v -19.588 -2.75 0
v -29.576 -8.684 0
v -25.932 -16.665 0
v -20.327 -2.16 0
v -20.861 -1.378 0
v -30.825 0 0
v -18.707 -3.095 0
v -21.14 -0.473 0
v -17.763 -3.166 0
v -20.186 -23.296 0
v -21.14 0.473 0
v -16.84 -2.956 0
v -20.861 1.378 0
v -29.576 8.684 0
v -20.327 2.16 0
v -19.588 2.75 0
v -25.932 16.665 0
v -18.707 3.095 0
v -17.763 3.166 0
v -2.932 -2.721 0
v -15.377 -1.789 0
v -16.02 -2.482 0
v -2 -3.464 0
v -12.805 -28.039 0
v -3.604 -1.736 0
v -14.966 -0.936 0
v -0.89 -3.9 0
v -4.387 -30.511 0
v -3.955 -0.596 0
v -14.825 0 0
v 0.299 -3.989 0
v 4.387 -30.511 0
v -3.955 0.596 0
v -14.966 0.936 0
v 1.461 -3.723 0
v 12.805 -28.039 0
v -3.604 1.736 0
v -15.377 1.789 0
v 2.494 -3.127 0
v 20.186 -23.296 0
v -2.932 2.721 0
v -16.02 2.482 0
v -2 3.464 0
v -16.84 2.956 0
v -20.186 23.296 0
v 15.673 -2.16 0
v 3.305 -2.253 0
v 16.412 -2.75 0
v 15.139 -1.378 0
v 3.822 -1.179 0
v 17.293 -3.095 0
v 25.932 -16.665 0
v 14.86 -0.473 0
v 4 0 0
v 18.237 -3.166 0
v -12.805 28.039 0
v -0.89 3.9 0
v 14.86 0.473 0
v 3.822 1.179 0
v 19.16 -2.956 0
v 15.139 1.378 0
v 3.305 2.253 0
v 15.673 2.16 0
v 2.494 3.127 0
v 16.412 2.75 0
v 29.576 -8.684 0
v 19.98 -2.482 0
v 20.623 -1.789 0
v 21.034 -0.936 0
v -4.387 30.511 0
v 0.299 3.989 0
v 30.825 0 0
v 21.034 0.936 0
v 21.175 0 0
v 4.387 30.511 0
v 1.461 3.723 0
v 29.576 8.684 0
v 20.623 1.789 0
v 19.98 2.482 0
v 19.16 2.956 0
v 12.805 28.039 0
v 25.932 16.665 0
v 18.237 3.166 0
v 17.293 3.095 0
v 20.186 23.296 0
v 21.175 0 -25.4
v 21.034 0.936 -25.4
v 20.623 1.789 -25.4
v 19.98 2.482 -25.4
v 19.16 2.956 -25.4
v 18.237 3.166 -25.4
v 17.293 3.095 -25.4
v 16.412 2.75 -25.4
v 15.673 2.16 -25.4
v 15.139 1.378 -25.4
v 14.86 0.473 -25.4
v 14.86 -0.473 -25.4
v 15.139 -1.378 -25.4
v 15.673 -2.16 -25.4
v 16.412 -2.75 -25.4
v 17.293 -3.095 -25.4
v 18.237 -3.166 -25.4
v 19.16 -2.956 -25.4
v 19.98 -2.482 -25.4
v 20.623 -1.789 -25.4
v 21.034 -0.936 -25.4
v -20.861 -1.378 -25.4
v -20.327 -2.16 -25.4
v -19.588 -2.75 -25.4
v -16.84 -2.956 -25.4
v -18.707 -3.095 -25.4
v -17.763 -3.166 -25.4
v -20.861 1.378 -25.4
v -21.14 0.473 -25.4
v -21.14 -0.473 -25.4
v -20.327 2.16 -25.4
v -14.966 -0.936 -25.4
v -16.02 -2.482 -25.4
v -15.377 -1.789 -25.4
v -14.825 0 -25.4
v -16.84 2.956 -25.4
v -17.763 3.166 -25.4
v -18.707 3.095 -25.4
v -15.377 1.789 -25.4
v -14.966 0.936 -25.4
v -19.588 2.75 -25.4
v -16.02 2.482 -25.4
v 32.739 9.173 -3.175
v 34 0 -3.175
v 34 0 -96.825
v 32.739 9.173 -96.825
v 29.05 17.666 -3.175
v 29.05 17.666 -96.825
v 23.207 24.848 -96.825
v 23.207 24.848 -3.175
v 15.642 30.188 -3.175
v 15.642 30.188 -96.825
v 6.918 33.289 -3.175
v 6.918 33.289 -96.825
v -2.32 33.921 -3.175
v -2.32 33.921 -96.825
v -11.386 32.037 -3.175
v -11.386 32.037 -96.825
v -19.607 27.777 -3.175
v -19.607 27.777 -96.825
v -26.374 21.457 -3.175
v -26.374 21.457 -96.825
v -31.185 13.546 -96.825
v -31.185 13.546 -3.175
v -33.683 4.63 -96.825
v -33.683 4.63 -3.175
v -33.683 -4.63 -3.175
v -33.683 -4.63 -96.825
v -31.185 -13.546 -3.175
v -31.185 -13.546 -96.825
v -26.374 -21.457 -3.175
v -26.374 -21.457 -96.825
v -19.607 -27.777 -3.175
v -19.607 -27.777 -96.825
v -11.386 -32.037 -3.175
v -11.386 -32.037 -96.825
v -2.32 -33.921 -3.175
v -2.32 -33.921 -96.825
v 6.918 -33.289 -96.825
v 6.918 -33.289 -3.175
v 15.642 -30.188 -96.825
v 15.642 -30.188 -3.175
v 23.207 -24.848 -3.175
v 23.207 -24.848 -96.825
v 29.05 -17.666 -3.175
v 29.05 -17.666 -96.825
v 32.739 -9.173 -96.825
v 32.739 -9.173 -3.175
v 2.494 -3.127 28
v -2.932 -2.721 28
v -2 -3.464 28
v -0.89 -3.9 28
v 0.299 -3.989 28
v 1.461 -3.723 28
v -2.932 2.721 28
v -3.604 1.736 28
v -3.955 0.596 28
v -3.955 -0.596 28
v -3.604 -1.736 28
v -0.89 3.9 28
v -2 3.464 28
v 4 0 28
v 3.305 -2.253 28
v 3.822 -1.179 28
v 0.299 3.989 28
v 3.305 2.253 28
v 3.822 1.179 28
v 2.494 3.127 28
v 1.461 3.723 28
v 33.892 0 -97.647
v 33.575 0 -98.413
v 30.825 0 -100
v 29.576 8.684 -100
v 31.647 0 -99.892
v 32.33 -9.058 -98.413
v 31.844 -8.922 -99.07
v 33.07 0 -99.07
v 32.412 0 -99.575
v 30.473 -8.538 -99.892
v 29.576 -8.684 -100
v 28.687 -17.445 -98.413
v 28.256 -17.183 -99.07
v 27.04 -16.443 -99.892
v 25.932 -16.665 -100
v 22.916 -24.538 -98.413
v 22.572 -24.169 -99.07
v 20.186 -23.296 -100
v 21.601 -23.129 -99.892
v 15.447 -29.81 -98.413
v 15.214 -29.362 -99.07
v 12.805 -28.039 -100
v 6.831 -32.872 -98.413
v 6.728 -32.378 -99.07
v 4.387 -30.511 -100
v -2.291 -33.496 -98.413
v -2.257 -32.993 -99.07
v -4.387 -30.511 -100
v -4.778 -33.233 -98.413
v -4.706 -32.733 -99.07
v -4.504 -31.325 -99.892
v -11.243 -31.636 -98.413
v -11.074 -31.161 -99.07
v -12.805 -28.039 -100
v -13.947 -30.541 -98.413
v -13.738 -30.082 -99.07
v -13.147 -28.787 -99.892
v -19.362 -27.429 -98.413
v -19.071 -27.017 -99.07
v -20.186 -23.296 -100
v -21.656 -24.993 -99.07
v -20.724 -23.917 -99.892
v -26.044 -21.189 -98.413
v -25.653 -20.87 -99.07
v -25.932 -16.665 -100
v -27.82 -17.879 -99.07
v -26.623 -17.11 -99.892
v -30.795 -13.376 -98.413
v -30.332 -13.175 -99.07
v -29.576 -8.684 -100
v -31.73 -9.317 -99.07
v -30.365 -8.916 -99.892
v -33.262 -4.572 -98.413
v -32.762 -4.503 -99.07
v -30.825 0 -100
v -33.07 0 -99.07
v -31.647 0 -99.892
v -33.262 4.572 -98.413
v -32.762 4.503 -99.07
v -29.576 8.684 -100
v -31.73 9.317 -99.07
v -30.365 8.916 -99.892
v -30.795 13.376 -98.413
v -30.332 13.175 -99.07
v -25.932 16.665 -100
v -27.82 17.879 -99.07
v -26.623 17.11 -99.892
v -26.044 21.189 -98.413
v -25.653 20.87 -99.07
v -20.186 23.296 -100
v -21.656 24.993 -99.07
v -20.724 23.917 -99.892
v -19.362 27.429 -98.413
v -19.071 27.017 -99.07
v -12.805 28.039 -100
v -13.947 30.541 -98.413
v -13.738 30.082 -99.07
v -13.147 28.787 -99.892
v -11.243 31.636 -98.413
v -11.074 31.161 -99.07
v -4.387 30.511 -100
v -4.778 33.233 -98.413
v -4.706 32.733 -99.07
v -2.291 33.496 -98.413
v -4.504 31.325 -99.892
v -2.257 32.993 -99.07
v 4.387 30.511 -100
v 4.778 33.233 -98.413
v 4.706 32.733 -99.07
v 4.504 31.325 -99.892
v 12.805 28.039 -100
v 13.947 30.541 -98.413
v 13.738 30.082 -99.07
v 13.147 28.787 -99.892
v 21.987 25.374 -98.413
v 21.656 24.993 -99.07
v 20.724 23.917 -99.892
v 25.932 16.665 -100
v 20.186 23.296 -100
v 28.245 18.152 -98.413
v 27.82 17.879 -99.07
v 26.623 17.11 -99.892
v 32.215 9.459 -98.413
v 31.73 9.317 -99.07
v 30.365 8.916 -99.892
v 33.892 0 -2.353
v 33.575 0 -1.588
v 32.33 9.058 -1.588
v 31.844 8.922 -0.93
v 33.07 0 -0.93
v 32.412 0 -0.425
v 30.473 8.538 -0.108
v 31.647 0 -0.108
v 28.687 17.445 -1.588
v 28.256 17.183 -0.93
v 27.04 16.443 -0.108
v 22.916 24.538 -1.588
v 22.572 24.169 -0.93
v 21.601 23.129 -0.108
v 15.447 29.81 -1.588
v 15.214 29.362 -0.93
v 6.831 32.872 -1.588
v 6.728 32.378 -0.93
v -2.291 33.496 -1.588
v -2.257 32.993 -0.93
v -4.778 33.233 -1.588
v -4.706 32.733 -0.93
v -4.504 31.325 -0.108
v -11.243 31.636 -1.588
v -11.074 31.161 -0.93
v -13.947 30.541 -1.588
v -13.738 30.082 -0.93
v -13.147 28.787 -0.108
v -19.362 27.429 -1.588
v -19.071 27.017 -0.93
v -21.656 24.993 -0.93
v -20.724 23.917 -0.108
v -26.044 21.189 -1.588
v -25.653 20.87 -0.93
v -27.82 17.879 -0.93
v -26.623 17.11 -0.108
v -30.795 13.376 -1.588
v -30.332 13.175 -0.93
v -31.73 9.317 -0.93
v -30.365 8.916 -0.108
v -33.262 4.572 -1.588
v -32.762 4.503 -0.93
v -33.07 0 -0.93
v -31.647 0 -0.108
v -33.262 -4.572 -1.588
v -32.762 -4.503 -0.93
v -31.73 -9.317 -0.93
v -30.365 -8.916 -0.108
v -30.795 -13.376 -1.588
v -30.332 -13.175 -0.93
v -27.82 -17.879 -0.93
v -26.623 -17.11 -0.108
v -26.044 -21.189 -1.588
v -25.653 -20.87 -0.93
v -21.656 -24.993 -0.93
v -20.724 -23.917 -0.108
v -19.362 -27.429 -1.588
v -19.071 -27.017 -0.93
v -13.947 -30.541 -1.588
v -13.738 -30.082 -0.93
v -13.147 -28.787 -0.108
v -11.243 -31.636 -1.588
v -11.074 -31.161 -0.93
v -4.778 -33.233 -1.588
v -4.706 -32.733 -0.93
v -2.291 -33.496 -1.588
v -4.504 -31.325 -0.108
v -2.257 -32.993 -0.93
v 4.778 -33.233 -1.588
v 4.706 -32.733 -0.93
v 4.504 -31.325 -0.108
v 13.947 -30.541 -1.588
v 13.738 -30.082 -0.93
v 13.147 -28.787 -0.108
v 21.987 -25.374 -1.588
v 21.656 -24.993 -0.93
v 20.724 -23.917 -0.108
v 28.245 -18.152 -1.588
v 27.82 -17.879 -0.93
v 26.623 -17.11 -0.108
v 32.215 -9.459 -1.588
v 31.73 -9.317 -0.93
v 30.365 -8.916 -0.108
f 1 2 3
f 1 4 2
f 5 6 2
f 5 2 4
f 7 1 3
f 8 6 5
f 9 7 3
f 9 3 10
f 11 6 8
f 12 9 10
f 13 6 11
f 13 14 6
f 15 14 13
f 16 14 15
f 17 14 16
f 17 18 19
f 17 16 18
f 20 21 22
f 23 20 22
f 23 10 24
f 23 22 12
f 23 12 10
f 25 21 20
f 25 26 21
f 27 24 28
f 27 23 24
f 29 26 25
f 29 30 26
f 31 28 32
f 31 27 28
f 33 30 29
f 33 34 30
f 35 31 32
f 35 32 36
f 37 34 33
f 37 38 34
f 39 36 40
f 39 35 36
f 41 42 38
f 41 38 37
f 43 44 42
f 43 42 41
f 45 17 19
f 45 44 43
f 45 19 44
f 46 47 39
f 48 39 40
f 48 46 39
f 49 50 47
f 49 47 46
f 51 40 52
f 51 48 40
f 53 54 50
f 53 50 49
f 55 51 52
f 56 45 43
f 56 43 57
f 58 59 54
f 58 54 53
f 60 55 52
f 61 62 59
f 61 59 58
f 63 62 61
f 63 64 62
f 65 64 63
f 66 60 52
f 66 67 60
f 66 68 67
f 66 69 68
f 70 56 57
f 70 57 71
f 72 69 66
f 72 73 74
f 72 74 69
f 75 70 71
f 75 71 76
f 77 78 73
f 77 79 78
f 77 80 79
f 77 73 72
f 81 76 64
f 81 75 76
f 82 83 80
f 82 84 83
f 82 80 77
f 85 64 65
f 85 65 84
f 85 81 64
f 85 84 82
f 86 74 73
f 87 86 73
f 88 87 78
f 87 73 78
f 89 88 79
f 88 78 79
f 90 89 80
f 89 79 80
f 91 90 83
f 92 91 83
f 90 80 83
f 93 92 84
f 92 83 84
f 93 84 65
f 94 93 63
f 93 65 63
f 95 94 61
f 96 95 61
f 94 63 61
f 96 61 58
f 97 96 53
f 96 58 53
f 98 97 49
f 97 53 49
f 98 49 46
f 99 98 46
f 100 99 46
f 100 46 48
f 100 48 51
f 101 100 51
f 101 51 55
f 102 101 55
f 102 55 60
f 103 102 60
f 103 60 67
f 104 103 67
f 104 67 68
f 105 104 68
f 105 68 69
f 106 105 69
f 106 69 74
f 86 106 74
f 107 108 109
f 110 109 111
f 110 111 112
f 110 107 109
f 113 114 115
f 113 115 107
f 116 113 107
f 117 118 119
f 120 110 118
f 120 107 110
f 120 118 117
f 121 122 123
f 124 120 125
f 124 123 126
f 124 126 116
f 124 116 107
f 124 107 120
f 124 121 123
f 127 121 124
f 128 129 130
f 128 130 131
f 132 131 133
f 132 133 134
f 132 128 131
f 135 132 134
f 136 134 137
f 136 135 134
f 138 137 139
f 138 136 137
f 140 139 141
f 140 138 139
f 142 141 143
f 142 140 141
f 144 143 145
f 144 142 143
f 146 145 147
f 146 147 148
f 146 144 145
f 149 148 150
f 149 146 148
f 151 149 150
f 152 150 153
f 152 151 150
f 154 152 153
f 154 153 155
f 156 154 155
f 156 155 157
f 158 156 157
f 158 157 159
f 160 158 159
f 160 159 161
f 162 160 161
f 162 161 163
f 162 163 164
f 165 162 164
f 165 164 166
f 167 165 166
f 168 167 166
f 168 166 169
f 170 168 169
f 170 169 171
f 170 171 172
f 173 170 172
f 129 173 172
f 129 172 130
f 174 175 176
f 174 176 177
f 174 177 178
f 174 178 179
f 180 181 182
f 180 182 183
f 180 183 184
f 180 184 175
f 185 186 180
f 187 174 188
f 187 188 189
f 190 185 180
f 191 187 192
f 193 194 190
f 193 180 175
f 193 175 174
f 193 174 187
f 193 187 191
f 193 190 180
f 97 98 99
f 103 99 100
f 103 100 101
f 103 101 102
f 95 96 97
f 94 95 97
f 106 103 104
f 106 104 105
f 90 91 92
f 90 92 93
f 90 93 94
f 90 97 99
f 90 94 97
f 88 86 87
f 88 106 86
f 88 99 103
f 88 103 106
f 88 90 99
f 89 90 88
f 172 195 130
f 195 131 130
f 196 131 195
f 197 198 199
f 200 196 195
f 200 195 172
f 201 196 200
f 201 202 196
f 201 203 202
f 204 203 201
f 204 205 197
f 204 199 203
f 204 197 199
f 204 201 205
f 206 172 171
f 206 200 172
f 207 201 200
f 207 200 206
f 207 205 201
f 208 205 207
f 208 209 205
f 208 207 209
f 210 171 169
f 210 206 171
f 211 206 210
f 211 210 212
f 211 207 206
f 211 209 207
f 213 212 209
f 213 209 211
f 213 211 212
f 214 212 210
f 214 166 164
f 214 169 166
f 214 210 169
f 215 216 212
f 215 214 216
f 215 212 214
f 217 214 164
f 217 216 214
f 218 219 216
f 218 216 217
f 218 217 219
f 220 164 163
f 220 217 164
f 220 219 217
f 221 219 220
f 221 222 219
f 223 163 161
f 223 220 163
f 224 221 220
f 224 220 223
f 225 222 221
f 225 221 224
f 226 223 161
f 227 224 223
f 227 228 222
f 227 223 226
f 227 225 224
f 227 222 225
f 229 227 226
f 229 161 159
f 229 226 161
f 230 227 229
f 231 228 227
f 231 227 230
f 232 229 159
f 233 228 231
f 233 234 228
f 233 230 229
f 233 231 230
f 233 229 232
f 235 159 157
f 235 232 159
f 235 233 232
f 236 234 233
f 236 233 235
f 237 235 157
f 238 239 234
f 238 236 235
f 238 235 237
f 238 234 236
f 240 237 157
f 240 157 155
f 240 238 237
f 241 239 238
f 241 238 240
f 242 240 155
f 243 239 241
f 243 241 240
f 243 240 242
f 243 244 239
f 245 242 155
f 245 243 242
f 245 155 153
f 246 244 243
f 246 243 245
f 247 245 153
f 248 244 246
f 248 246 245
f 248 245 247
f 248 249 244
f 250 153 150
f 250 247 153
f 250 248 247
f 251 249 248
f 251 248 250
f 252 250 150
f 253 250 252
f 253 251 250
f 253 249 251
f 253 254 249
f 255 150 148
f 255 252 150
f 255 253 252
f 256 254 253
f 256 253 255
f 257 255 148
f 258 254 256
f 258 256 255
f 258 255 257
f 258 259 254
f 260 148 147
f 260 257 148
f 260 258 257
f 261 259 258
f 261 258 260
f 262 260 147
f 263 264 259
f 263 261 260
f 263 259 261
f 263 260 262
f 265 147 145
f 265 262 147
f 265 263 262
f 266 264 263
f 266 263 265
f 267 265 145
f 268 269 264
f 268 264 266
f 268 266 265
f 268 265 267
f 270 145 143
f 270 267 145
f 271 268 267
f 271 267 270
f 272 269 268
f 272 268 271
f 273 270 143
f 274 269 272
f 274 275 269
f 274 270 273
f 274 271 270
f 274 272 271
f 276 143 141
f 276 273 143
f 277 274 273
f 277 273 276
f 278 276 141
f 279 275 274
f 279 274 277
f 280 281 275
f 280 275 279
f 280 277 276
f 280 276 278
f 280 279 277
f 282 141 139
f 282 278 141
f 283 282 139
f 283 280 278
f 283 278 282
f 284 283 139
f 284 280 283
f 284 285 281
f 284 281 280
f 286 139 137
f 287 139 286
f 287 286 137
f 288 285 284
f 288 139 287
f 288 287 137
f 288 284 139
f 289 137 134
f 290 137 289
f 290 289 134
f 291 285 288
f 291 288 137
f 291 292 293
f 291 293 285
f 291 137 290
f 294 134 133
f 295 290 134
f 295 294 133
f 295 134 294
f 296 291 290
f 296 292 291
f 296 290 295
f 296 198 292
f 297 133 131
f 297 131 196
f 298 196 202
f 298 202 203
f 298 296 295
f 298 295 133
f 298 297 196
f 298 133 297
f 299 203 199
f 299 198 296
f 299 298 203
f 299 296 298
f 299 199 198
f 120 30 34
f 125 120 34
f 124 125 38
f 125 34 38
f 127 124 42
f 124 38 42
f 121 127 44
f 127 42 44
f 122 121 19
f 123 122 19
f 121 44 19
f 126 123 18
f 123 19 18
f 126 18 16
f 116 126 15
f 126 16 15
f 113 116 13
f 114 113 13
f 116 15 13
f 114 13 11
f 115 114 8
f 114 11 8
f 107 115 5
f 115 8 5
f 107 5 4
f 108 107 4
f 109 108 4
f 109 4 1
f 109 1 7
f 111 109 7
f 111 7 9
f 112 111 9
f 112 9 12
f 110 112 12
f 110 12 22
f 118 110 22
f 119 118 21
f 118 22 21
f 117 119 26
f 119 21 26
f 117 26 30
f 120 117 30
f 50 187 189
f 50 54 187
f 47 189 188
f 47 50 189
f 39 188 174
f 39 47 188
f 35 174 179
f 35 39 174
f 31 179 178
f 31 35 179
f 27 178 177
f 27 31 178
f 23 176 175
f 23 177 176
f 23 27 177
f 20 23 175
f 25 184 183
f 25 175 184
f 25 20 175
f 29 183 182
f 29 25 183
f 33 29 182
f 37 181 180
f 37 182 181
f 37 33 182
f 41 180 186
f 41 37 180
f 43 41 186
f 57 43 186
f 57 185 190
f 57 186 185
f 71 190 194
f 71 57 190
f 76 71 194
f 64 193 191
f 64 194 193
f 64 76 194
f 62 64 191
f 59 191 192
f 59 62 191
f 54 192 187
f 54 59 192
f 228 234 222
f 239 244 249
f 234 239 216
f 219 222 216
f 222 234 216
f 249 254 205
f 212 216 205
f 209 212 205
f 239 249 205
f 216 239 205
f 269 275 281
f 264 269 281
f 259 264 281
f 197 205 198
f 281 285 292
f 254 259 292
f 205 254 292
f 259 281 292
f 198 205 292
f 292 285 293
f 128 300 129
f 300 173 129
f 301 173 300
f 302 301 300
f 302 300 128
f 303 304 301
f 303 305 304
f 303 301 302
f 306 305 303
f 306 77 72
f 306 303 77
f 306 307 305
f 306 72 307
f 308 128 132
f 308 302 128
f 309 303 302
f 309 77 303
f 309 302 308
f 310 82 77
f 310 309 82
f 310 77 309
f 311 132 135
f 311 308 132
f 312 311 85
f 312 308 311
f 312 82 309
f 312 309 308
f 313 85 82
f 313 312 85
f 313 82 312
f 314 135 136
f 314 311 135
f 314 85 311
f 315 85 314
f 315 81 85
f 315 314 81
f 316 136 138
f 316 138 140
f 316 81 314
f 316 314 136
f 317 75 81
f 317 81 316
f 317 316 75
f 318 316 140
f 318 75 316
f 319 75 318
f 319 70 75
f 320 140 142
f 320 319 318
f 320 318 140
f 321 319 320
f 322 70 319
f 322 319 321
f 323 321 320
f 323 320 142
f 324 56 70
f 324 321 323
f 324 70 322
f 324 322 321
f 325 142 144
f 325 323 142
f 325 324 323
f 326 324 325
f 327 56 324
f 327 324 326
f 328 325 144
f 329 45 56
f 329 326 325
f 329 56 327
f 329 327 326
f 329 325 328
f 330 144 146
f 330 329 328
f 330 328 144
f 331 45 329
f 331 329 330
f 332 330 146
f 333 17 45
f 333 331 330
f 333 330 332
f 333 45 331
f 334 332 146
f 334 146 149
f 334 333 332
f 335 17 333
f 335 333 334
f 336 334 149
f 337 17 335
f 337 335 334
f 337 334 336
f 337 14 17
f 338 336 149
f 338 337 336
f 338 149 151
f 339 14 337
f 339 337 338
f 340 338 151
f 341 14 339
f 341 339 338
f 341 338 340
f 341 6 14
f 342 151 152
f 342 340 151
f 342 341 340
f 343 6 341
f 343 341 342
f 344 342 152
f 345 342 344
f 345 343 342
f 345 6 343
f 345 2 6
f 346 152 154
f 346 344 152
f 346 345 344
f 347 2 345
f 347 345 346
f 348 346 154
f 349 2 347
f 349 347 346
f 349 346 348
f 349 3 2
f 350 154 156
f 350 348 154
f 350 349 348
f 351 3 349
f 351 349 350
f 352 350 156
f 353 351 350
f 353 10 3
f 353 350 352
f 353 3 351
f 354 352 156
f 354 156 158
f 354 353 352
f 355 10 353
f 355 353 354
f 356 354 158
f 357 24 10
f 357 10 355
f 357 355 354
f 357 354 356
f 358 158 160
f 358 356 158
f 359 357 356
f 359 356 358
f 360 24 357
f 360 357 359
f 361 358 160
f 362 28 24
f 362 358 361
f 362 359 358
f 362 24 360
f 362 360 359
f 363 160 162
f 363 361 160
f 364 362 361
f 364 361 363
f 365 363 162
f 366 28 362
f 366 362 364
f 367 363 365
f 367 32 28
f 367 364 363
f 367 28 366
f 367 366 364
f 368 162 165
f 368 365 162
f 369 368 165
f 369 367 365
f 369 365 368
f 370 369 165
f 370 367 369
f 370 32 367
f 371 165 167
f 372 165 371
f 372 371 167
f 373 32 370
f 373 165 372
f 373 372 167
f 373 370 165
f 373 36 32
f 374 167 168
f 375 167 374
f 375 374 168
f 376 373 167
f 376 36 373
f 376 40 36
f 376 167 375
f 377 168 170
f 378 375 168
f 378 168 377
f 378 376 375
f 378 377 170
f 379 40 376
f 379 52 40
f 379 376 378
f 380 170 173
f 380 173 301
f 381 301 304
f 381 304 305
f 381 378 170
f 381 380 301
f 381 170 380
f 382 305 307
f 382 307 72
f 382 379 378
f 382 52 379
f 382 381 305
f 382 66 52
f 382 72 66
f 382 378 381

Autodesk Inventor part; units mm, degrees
ref_plane "YZ Plane" through (0, 0, 0) normal (1, 0, 0) x (0, 1, 0)
ref_plane "XZ Plane" through (0, 0, 0) normal (0, 1, 0) x (-1, 0, 0)
ref_plane "XY Plane" through (0, 0, 0) normal (0, 0, 1) x (1, 0, 0)
sketch "Sketch1" plane through (0, 0, 0) normal (0, 0, 1) x (1, 0, 0)
  circle A0 centre (0, 0) radius 34
  circle A1 centre (0, 0) radius 4
  circle A2 centre (-18, 0) radius 3.175
  circle A3 centre (18, 0) radius 3.175
  dimension "d0" = 68
  dimension "d1" = 8
  dimension "d2" = 18
  dimension "d3" = 18
  dimension "d4" = 6.35
extrude "Extrusion1" add sketch "Sketch1" against normal blind 100 contours A0 | A1 | A2 | A3
extrude "Extrusion2" cut sketch "Sketch1" against normal blind 25.4 contours A2 | A3
extrude "Extrusion3" add sketch "Sketch1" along normal blind 28 contours A1
fillet "Fillet1" radius 3.175 2 edges at (-34, 0, 0) (-34, 0, -100)
equation "\"d3\" = d2"
properties part number "DC Brush Motor 24V 150W High Speed Motor with Belt Pulley for DIY Generator Electric Vehicle Motor"
